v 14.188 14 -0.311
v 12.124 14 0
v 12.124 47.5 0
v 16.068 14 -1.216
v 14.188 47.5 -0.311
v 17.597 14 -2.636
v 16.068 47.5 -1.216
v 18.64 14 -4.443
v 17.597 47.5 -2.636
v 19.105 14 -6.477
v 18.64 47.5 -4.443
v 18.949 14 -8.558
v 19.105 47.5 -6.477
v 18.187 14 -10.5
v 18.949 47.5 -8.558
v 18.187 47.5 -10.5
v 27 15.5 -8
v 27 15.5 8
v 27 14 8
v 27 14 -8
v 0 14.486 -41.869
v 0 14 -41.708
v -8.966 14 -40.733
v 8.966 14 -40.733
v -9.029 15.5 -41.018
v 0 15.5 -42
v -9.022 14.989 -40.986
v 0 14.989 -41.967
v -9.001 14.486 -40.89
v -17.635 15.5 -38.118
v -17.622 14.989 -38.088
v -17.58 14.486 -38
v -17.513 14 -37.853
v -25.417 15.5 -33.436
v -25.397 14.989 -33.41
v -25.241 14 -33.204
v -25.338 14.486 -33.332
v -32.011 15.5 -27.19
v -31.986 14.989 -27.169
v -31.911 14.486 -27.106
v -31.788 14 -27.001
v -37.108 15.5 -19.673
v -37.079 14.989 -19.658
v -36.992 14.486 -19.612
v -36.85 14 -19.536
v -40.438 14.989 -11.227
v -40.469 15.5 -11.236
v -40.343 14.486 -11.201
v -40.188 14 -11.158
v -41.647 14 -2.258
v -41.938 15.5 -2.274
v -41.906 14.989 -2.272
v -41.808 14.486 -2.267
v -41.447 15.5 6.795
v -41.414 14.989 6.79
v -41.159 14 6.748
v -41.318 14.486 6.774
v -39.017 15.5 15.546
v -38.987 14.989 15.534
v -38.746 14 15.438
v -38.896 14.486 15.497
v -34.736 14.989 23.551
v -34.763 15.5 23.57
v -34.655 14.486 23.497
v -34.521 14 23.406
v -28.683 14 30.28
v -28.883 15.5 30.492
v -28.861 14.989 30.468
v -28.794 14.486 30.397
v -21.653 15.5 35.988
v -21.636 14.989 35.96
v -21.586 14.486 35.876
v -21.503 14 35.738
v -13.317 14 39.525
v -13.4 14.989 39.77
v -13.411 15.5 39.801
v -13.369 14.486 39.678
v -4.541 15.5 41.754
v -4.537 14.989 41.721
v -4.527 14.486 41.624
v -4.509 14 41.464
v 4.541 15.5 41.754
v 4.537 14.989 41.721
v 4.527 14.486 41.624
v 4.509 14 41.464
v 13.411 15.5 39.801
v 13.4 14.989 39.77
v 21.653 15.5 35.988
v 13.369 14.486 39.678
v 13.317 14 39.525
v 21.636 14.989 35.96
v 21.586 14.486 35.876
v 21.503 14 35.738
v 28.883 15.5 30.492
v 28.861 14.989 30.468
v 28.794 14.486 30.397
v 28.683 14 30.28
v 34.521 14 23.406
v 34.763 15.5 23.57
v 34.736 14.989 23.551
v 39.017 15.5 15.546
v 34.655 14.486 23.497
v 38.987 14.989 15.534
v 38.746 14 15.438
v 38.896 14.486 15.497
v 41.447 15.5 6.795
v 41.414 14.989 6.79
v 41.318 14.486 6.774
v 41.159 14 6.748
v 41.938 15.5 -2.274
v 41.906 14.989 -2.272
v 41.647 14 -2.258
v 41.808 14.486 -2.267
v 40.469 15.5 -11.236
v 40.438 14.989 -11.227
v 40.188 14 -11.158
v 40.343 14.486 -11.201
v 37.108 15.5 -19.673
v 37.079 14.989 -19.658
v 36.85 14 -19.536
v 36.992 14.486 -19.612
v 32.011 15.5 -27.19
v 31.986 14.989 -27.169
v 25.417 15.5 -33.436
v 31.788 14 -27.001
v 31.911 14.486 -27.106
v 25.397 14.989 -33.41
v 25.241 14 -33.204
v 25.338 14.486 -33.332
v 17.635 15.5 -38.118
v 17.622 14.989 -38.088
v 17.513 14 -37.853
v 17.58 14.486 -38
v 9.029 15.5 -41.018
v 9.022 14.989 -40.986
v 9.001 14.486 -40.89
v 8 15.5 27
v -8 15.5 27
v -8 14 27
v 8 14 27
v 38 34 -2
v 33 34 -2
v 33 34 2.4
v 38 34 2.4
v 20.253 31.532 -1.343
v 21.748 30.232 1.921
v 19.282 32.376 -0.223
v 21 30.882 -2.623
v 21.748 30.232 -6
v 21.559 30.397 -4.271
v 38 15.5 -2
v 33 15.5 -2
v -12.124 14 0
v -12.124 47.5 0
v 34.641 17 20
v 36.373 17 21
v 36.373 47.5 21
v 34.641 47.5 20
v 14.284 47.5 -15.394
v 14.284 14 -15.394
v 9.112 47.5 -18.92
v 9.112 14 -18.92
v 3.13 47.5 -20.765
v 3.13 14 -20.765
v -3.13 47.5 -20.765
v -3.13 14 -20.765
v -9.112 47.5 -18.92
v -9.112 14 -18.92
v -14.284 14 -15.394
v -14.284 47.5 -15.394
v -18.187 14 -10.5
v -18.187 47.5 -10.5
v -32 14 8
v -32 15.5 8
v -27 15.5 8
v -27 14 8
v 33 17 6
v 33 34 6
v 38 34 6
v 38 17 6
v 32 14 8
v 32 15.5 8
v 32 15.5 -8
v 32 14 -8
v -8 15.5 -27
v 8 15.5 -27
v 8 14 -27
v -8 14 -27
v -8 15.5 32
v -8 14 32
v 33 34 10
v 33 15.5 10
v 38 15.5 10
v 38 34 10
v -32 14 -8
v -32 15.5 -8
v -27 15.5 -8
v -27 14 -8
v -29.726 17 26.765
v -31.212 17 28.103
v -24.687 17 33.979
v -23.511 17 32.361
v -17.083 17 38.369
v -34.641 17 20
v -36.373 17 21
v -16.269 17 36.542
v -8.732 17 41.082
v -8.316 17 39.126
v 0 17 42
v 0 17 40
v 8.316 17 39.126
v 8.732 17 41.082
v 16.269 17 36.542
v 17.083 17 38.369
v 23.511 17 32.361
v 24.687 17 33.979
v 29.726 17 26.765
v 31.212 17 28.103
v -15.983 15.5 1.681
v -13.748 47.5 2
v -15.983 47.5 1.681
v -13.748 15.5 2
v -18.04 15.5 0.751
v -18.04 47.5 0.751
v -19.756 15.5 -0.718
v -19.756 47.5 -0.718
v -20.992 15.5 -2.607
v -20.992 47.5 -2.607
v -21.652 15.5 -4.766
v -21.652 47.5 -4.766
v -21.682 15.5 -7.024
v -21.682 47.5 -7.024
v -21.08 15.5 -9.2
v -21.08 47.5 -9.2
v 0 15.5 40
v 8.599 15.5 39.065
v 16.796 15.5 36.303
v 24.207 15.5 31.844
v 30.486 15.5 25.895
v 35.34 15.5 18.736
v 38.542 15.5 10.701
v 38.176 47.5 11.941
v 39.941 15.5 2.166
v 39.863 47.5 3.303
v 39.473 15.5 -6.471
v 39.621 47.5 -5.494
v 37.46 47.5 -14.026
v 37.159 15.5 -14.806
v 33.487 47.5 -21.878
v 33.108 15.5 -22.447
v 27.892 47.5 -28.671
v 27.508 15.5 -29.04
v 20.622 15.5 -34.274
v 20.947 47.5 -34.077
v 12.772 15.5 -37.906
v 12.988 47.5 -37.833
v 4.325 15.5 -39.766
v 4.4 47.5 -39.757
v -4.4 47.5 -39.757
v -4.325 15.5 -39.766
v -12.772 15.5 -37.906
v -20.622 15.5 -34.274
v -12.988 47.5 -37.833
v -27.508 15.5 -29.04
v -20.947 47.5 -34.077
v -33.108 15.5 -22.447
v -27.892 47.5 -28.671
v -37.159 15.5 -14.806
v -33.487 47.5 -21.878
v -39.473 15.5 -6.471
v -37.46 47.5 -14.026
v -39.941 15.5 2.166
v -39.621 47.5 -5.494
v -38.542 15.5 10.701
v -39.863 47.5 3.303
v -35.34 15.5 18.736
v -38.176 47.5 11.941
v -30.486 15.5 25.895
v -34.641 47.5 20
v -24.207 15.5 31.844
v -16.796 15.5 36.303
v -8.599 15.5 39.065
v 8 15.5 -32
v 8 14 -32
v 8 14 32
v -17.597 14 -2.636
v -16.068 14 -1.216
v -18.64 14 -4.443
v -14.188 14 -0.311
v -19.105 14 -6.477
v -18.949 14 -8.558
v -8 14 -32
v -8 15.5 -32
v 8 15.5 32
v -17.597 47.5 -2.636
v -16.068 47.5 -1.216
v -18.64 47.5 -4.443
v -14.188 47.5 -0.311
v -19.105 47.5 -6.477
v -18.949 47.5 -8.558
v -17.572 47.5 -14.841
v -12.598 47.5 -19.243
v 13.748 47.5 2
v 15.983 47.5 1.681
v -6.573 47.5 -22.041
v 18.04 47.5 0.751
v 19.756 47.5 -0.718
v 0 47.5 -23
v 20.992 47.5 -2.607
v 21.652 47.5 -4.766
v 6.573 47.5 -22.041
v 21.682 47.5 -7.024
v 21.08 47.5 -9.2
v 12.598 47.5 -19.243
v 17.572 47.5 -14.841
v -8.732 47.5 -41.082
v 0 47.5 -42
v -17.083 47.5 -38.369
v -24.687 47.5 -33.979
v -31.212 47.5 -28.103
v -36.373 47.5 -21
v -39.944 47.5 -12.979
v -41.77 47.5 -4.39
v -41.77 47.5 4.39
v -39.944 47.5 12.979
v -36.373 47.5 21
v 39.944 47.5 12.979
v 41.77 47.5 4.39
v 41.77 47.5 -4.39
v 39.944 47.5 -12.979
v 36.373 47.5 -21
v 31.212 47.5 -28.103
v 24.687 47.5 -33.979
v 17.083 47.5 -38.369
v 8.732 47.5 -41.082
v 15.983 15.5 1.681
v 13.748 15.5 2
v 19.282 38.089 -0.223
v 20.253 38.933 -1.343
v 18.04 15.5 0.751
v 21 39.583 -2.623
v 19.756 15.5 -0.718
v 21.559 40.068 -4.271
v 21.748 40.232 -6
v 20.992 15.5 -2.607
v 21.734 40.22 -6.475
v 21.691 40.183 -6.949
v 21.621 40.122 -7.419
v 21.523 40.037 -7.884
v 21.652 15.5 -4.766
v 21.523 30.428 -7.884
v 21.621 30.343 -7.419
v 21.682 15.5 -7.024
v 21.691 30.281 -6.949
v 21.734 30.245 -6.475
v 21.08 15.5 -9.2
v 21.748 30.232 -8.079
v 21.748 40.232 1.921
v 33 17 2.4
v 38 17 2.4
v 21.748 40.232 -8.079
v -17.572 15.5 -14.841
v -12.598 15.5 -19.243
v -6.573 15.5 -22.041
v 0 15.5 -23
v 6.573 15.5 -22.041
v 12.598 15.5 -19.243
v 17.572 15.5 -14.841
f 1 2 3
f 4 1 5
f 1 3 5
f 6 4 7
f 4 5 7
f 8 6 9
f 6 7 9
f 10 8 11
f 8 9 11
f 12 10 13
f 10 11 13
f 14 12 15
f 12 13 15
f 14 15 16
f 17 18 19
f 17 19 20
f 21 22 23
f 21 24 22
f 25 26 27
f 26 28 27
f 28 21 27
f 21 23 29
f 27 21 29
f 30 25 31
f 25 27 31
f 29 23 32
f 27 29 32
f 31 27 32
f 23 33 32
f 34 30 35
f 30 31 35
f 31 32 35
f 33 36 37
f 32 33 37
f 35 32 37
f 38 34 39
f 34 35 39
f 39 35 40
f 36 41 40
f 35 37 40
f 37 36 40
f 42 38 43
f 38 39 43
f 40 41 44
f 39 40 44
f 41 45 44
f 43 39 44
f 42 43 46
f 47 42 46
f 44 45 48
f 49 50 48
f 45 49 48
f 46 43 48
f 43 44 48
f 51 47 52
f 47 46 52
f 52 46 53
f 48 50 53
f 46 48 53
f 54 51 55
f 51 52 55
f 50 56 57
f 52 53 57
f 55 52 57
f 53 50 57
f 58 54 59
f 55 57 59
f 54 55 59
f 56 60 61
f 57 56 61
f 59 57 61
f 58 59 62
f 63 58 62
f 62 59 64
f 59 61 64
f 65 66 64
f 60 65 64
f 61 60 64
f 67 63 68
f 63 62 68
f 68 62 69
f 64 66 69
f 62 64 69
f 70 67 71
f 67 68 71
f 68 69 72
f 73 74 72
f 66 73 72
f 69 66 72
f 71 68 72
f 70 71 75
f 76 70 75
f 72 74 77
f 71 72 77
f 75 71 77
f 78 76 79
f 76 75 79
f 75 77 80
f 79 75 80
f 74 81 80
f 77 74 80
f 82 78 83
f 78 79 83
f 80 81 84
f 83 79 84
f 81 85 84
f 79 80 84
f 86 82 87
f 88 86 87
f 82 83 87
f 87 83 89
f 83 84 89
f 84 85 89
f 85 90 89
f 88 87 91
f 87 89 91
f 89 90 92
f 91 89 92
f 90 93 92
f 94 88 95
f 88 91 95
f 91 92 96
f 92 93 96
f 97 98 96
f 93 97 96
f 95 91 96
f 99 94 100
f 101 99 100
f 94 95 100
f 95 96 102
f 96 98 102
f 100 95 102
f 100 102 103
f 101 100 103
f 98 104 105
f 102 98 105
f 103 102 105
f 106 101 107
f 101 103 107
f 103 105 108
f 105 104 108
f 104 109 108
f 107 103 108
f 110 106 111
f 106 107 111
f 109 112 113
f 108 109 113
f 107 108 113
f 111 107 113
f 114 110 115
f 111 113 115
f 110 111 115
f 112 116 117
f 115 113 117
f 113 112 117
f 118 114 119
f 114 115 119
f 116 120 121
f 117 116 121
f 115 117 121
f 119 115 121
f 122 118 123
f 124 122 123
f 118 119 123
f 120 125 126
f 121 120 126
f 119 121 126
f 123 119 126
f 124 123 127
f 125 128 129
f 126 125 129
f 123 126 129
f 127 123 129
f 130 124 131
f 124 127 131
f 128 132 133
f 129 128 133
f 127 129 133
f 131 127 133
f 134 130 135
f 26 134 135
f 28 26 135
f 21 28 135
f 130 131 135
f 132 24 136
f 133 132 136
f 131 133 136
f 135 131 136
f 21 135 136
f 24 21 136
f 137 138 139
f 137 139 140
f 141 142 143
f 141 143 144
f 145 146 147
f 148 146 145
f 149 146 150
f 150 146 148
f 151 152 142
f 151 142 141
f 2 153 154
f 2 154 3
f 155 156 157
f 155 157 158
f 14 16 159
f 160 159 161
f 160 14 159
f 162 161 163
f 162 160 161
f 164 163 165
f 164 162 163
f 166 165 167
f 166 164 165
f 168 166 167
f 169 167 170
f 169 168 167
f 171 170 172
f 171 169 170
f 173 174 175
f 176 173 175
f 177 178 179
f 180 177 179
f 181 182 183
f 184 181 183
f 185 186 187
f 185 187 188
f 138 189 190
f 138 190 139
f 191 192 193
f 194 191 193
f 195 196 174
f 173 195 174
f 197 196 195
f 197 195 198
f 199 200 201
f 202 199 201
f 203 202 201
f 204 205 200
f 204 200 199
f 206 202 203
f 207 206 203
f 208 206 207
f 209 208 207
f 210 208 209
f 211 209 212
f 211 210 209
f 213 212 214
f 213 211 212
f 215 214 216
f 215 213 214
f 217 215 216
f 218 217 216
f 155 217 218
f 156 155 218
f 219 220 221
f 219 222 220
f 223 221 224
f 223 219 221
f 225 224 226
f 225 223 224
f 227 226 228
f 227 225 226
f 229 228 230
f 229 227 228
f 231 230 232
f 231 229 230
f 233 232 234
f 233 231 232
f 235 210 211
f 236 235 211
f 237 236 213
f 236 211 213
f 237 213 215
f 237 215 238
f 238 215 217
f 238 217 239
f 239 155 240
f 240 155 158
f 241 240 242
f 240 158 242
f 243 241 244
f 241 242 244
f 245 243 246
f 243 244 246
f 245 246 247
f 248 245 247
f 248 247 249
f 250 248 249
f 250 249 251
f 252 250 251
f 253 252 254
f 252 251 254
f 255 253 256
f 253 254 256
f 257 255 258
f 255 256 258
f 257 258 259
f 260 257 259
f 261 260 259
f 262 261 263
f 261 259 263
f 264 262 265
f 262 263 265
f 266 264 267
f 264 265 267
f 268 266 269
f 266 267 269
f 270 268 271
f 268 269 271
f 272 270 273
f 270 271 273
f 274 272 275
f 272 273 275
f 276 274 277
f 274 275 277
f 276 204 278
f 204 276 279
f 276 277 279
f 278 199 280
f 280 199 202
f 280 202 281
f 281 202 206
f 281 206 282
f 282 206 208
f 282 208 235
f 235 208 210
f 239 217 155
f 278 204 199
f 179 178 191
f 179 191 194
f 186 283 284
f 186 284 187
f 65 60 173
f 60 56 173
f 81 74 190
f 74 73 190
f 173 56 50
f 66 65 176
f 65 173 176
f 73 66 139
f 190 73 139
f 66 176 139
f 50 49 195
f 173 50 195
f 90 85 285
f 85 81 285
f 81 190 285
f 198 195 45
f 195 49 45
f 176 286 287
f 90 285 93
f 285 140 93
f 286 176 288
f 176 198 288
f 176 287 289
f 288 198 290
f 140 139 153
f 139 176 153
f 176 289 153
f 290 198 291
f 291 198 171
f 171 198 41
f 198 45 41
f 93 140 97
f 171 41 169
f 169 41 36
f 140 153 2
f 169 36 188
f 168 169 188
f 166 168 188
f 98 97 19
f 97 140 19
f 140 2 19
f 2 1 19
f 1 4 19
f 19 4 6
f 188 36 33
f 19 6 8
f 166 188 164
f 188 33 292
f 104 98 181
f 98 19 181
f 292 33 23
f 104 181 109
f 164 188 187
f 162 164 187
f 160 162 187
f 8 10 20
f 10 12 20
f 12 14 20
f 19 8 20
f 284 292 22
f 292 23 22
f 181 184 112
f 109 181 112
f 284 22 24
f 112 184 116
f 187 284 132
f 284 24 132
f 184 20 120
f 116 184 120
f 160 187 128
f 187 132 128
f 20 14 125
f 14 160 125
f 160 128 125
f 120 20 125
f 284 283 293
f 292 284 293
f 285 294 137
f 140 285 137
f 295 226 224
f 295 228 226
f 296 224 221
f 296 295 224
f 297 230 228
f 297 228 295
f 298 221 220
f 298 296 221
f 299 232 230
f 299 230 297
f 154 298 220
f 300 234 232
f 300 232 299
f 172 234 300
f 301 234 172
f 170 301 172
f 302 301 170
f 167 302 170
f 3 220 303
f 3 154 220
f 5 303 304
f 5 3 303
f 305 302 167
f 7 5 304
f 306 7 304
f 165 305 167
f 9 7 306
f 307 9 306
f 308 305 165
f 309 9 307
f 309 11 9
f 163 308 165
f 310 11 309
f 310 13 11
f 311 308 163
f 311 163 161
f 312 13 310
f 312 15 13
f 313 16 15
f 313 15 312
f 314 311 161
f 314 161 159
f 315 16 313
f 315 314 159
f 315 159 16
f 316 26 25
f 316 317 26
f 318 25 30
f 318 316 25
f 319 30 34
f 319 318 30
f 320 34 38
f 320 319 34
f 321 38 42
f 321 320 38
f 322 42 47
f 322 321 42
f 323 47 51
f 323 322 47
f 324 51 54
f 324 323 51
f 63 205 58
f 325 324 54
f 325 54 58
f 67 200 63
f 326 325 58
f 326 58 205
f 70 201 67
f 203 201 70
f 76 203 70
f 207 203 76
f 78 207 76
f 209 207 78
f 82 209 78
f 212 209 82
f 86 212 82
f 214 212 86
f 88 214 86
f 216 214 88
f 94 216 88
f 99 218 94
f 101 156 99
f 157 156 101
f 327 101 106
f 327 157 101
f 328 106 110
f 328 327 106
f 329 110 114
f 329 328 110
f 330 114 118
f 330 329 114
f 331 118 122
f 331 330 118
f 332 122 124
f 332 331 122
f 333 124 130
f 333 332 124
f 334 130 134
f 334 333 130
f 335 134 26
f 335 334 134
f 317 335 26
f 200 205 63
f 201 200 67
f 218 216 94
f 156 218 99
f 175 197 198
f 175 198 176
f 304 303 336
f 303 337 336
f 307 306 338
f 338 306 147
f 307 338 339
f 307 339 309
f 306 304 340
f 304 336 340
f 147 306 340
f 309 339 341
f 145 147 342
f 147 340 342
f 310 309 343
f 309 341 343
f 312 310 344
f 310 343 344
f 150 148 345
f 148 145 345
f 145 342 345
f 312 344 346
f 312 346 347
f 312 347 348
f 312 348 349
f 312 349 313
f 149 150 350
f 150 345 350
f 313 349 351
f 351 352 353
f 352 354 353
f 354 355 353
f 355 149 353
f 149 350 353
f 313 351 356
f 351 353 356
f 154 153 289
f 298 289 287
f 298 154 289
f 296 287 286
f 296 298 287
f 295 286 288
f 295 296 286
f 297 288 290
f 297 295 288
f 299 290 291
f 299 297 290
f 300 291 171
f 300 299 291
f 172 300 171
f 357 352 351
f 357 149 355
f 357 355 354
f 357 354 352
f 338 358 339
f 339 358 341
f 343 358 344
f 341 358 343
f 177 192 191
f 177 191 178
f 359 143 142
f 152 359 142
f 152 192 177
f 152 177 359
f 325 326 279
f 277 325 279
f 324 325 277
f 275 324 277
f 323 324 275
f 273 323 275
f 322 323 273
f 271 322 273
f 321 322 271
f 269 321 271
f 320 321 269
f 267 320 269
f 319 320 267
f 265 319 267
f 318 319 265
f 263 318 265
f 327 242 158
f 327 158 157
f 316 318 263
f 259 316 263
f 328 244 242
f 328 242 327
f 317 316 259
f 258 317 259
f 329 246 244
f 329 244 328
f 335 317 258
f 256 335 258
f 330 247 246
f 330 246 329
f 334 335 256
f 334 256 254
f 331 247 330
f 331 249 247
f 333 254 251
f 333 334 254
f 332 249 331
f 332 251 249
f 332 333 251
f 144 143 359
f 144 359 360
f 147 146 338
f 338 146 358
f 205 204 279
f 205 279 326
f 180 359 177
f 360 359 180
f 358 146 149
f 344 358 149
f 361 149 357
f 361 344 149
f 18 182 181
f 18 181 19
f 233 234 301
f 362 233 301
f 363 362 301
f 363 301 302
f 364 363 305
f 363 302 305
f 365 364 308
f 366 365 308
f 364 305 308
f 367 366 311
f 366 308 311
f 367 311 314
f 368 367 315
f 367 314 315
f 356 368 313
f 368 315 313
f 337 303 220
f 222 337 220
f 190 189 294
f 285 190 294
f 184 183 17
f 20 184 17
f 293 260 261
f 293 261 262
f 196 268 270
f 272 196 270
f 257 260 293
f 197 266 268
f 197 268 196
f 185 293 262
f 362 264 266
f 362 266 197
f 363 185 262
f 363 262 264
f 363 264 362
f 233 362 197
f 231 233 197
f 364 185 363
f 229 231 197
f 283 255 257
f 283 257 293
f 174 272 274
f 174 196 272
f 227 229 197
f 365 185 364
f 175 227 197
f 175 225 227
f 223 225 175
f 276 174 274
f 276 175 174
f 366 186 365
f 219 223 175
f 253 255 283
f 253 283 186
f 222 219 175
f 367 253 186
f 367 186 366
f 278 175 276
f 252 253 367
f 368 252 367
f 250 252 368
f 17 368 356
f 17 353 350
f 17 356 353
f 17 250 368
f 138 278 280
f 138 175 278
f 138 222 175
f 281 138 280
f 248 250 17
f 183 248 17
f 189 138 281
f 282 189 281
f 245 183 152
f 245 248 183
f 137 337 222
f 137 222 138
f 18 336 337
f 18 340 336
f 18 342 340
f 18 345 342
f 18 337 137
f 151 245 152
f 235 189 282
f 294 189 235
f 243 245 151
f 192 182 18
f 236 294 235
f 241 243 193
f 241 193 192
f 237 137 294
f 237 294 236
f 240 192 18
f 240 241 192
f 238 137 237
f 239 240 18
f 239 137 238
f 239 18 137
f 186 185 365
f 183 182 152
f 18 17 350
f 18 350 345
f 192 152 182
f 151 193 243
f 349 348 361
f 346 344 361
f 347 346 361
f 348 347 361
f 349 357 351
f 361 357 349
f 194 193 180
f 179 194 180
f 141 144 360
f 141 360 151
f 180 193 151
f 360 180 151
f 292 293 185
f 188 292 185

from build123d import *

# Parameters (mm, degrees)
CUT_EXTRUDE1_DEPTH     = 5
CUT_EXTRUDE3_DEPTH     = 45
SKETCH8_R              = 40
CUT_EXTRUDE4_DEPTH     = 32
FILLET1_R              = 7
FILLET2_R              = 8
CUT_REVOLVE1_START     = 17
CUT_REVOLVE1_DEPTH     = 30.5
SKETCH18_W             = 13
SKETCH18_H             = 8
CUT_EXTRUDE13_DEPTH    = 5
SKETCH20_W             = 84
SKETCH20_H             = 7
CUT_EXTRUDE15_DEPTH    = 5
SKETCH19_R             = 1.5
CUT_EXTRUDE14_DEPTH    = 12
FILLET3_R              = 4
SKETCH21_W             = 16
SKETCH21_H             = 5
CUT_EXTRUDE16_DEPTH    = 5
CIRPATTERN1_COUNT      = 4
SKETCH22_W             = 5
SKETCH22_H             = 12
BOSS_EXTRUDE1_DEPTH    = 1.5
SKETCH23_W             = 5
SKETCH23_H             = 4.4
SKETCH23_H_2           = 4
BOSS_EXTRUDE2_DEPTH    = 17
SKETCH24_W             = 2
SKETCH24_H             = 3
BOSS_EXTRUDE3_DEPTH    = 2
CIRPATTERN2_COUNT      = 5
INTERSECT1_START       = 47.5
INTERSECT1_OUTLINE_R   = 42
INTERSECT1_OUTLINE_W   = 13
INTERSECT1_OUTLINE_H   = 8
INTERSECT1_DEPTH       = 7.5
INTERSECT2_OUTLINE_W   = 86
INTERSECT2_OUTLINE_H   = 86
INTERSECT2_OUTLINE_W_2 = 5
INTERSECT2_OUTLINE_H_2 = 16
INTERSECT2_OUTLINE_W_3 = 16
INTERSECT2_OUTLINE_H_3 = 5
INTERSECT2_DEPTH       = 14
SKETCH28_W             = 10
SKETCH28_H             = 10
BOSS_EXTRUDE4_DEPTH    = 2.5
BOSS_EXTRUDE4_DRAFT    = -41


# Read off the part's stored shape, not the designer's step: Cut-Revolve1, Intersect1, Intersect2
with BuildPart() as part:
    # Sketch1 → Revolve1 (revolve)
    with BuildSketch(Plane.XY, mode=Mode.PRIVATE) as revolve1_sk:
        with BuildLine():
            Line((37, 55), (0, 55))
            Line((0, 55), (0, 11.5))
            Line((0, 11.5), (22.5, 11.5))
            Line((22.5, 11.5), (22.5, 0))
            Line((22.5, 0), (25, 0))
            Line((25, 0), (25, 11.5))
            Line((25, 11.5), (42, 11.5))
            Line((42, 11.5), (42, 50))
            ThreePointArc((42, 50), (40.535533906, 53.535533906), (37, 55))
        make_face()
    revolve(revolve1_sk.sketch.rotate(Axis((0, 2, 0), (0, 1, 0)), 90), axis=Axis((0, 2, 0), (0, 1, 0)))

    # Sketch5 → Cut-Extrude1 (cut)
    with BuildSketch(Plane(origin=(0, 55, 0), x_dir=(1, 0, 0), z_dir=(0, 1, 0))):
        with BuildLine():
            Line((-42, 0), (-40, 0))
            Line((-40, 0), (40, 0))
            Line((40, 0), (42, 0))
            ThreePointArc((42, 0), (0, 42), (-42, 0))
        make_face()
    extrude(amount=-CUT_EXTRUDE1_DEPTH, mode=Mode.SUBTRACT)

    # Sketch7 → Cut-Extrude3 (cut)
    with BuildSketch(Plane.XZ.offset(-11.5)):
        with BuildLine():
            Line((-21, 0), (21, 0))
            ThreePointArc((21, 0), (0, -21), (-21, 0))
        make_face()
    extrude(amount=-CUT_EXTRUDE3_DEPTH, mode=Mode.SUBTRACT)

    # Sketch8 → Cut-Extrude4 (cut)
    with BuildSketch(Plane(origin=(0, 47.5, 0), x_dir=(1, 0, 0), z_dir=(0, 1, 0))):
        with Locations(Location((0, 0, 0), (0, 0, 270))):
            Circle(SKETCH8_R)
        with BuildLine():
            Line((22.912878475, -2), (-22.912878475, -2))
            ThreePointArc((-22.912878475, -2), (0, 23), (22.912878475, -2))
        make_face(mode=Mode.SUBTRACT)
    extrude(amount=-CUT_EXTRUDE4_DEPTH, mode=Mode.SUBTRACT)

    # Fillet1
    fillet1_edges = [part.edges().sort_by_distance(p)[0] for p in [
        (21, 30.75, 0),
        (-21, 30.75, 0),
    ]]
    fillet(fillet1_edges, radius=FILLET1_R)

    # Fillet2
    fillet2_edges = [part.edges().sort_by_distance(p)[0] for p in [
        (-22.912878475, 31.5, 2),
        (22.912878475, 31.5, 2),
    ]]
    fillet(fillet2_edges, radius=FILLET2_R)

    # Cut-Revolve1 outline → Cut-Revolve1 (cut)
    with BuildSketch(Plane(origin=(0, 0, 0), x_dir=(1, 0, 0), z_dir=(0, 1, 0)).offset(CUT_REVOLVE1_START)):
        with BuildLine():
            Line((-34.641016151, -20), (-36.373066959, -21))
            ThreePointArc((-36.373066959, -21), (0, -42), (36.373066959, -21))
            Line((36.373066959, -21), (34.641016151, -20))
            ThreePointArc((34.641016151, -20), (0, -40), (-34.641016151, -20))
        make_face()
    extrude(amount=CUT_REVOLVE1_DEPTH, mode=Mode.SUBTRACT)

    # Sketch18 → Cut-Extrude13 (cut)
    with BuildSketch(Plane(origin=(0, 50, 0), x_dir=(1, 0, 0), z_dir=(0, 1, 0))):
        with Locations((0.796512215, 32.951769165)):
            Rectangle(SKETCH18_W, SKETCH18_H)
    extrude(amount=-CUT_EXTRUDE13_DEPTH, mode=Mode.SUBTRACT)

    # Sketch20 → Cut-Extrude15 (cut)
    with BuildSketch(Plane(origin=(0, 55, 0), x_dir=(1, 0, 0), z_dir=(0, 1, 0))):
        with Locations((0, -3.5)):
            Rectangle(SKETCH20_W, SKETCH20_H)
    extrude(amount=-CUT_EXTRUDE15_DEPTH, mode=Mode.SUBTRACT)

    # Sketch19 → Cut-Extrude14 (cut)
    with BuildSketch(Plane(origin=(0, 0, 7), x_dir=(-1, 0, 0), z_dir=(0, 0, -1))):
        with Locations((0, 52.5)):
            Circle(SKETCH19_R)
        with Locations((-29.412558482, 52.5)):
            Circle(SKETCH19_R)
        with Locations((29.412558482, 52.5)):
            Circle(SKETCH19_R)
    extrude(amount=-CUT_EXTRUDE14_DEPTH, mode=Mode.SUBTRACT)

    # Fillet3
    fillet3_edges = [part.edges().sort_by_distance(p)[0] for p in [
        (0, 11.5, 42),
    ]]
    fillet(fillet3_edges, radius=FILLET3_R)

    # Sketch21 → Cut-Extrude16 (cut)
    with BuildSketch(Plane(origin=(0, 15.5, 0), x_dir=(1, 0, 0), z_dir=(0, 1, 0))):
        with Locations((0, -29.5)):
            Rectangle(SKETCH21_W, SKETCH21_H)
    cut_extrude16 = extrude(amount=-CUT_EXTRUDE16_DEPTH, mode=Mode.SUBTRACT)

    # CirPattern1: Cut-Extrude16 ×4 about axis
    cirpattern1_axis = Axis((0, 0, 0), (0, 1, 0))
    for i in range(1, CIRPATTERN1_COUNT):
        add(cut_extrude16.rotate(cirpattern1_axis, i * 360 / CIRPATTERN1_COUNT), mode=Mode.SUBTRACT)

    # Sketch22 → Boss-Extrude1 (add)
    with BuildSketch(Plane(origin=(0, 15.5, 0), x_dir=(1, 0, 0), z_dir=(0, 1, 0))):
        with Locations((35.5, -4)):
            Rectangle(SKETCH22_W, SKETCH22_H)
    extrude(amount=BOSS_EXTRUDE1_DEPTH)

    # Sketch23 → Boss-Extrude2 (add)
    with BuildSketch(Plane(origin=(0, 17, 0), x_dir=(1, 0, 0), z_dir=(0, 1, 0))):
        with Locations((35.5, -0.2)):
            Rectangle(SKETCH23_W, SKETCH23_H)
        with Locations((35.5, -8)):
            Rectangle(SKETCH23_W, SKETCH23_H_2)
    extrude(amount=BOSS_EXTRUDE2_DEPTH)

    # Sketch24 → Boss-Extrude3 (add)
    with BuildSketch(Plane.XZ):
        with Locations((0, -22.5)):
            Rectangle(SKETCH24_W, SKETCH24_H)
    boss_extrude3 = extrude(amount=-BOSS_EXTRUDE3_DEPTH)

    # CirPattern2: Boss-Extrude3 ×5 about axis
    cirpattern2_axis = Axis((0, 0, 0), (0, 1, 0))
    for i in range(1, CIRPATTERN2_COUNT):
        add(boss_extrude3.rotate(cirpattern2_axis, i * 360 / CIRPATTERN2_COUNT))

    # Intersect1 outline → Intersect1 (cut)
    with BuildSketch(Plane(origin=(0, 0, 0), x_dir=(1, 0, 0), z_dir=(0, 1, 0)).offset(INTERSECT1_START)):
        Circle(INTERSECT1_OUTLINE_R)
        with BuildLine():
            Line((12.124355653, 0), (-12.124355653, 0))
            ThreePointArc((-12.124355653, 0), (-18.186533479, 3.5), (-18.186533479, 10.5))
            ThreePointArc((-18.186533479, 10.5), (0, 21), (18.186533479, 10.5))
            ThreePointArc((18.186533479, 10.5), (18.186533479, 3.5), (12.124355653, 0))
        make_face(mode=Mode.SUBTRACT)
        with Locations((0.796512215, 32.951769165)):
            Rectangle(INTERSECT1_OUTLINE_W, INTERSECT1_OUTLINE_H, mode=Mode.SUBTRACT)
    extrude(amount=INTERSECT1_DEPTH, mode=Mode.SUBTRACT)

    # Intersect2 outline → Intersect2 (cut)
    with BuildSketch(Plane(origin=(0, 0, 0), x_dir=(1, 0, 0), z_dir=(0, 1, 0))):
        Rectangle(INTERSECT2_OUTLINE_W, INTERSECT2_OUTLINE_H)
        with Locations((29.5, 0)):
            Rectangle(INTERSECT2_OUTLINE_W_2, INTERSECT2_OUTLINE_H_2, mode=Mode.SUBTRACT)
        with Locations((0, -29.5)):
            Rectangle(INTERSECT2_OUTLINE_W_3, INTERSECT2_OUTLINE_H_3, mode=Mode.SUBTRACT)
        with Locations((0, 29.5)):
            Rectangle(INTERSECT2_OUTLINE_W_3, INTERSECT2_OUTLINE_H_3, mode=Mode.SUBTRACT)
        with Locations((-29.5, 0)):
            Rectangle(INTERSECT2_OUTLINE_W_2, INTERSECT2_OUTLINE_H_2, mode=Mode.SUBTRACT)
    extrude(amount=INTERSECT2_DEPTH, mode=Mode.SUBTRACT)


with BuildPart() as boss_extrude4_tool:
    # Sketch28 → Boss-Extrude4 (with draft: the straight prism first)
    with BuildSketch(Plane(origin=(21.747727085, 0, 0), x_dir=(0, 0, -1), z_dir=(1, 0, 0))):
        with Locations((3.079158512, 35.232399588)):
            Rectangle(SKETCH28_W, SKETCH28_H)
    extrude(amount=-BOSS_EXTRUDE4_DEPTH)
    # Boss-Extrude4: the draft: its side faces are tilted about the plane it starts from
    boss_extrude4_sides = [boss_extrude4_tool.faces().sort_by_distance(p)[0] for p in [
        (20.497727085, 35.232399588, 1.920841488),
        (20.497727085, 30.232399588, -3.079158512),
        (20.497727085, 35.232399588, -8.079158512),
        (20.497727085, 40.232399588, -3.079158512),
    ]]
    draft(boss_extrude4_sides, Plane(origin=(21.747727085, 0, 0), x_dir=(0, 0, -1), z_dir=(1, 0, 0)), BOSS_EXTRUDE4_DRAFT)


with BuildPart() as part_1:
    add(part.part)

    # Boss-Extrude4: add boss_extrude4_tool
    add(boss_extrude4_tool.part)


solid = part_1.part
